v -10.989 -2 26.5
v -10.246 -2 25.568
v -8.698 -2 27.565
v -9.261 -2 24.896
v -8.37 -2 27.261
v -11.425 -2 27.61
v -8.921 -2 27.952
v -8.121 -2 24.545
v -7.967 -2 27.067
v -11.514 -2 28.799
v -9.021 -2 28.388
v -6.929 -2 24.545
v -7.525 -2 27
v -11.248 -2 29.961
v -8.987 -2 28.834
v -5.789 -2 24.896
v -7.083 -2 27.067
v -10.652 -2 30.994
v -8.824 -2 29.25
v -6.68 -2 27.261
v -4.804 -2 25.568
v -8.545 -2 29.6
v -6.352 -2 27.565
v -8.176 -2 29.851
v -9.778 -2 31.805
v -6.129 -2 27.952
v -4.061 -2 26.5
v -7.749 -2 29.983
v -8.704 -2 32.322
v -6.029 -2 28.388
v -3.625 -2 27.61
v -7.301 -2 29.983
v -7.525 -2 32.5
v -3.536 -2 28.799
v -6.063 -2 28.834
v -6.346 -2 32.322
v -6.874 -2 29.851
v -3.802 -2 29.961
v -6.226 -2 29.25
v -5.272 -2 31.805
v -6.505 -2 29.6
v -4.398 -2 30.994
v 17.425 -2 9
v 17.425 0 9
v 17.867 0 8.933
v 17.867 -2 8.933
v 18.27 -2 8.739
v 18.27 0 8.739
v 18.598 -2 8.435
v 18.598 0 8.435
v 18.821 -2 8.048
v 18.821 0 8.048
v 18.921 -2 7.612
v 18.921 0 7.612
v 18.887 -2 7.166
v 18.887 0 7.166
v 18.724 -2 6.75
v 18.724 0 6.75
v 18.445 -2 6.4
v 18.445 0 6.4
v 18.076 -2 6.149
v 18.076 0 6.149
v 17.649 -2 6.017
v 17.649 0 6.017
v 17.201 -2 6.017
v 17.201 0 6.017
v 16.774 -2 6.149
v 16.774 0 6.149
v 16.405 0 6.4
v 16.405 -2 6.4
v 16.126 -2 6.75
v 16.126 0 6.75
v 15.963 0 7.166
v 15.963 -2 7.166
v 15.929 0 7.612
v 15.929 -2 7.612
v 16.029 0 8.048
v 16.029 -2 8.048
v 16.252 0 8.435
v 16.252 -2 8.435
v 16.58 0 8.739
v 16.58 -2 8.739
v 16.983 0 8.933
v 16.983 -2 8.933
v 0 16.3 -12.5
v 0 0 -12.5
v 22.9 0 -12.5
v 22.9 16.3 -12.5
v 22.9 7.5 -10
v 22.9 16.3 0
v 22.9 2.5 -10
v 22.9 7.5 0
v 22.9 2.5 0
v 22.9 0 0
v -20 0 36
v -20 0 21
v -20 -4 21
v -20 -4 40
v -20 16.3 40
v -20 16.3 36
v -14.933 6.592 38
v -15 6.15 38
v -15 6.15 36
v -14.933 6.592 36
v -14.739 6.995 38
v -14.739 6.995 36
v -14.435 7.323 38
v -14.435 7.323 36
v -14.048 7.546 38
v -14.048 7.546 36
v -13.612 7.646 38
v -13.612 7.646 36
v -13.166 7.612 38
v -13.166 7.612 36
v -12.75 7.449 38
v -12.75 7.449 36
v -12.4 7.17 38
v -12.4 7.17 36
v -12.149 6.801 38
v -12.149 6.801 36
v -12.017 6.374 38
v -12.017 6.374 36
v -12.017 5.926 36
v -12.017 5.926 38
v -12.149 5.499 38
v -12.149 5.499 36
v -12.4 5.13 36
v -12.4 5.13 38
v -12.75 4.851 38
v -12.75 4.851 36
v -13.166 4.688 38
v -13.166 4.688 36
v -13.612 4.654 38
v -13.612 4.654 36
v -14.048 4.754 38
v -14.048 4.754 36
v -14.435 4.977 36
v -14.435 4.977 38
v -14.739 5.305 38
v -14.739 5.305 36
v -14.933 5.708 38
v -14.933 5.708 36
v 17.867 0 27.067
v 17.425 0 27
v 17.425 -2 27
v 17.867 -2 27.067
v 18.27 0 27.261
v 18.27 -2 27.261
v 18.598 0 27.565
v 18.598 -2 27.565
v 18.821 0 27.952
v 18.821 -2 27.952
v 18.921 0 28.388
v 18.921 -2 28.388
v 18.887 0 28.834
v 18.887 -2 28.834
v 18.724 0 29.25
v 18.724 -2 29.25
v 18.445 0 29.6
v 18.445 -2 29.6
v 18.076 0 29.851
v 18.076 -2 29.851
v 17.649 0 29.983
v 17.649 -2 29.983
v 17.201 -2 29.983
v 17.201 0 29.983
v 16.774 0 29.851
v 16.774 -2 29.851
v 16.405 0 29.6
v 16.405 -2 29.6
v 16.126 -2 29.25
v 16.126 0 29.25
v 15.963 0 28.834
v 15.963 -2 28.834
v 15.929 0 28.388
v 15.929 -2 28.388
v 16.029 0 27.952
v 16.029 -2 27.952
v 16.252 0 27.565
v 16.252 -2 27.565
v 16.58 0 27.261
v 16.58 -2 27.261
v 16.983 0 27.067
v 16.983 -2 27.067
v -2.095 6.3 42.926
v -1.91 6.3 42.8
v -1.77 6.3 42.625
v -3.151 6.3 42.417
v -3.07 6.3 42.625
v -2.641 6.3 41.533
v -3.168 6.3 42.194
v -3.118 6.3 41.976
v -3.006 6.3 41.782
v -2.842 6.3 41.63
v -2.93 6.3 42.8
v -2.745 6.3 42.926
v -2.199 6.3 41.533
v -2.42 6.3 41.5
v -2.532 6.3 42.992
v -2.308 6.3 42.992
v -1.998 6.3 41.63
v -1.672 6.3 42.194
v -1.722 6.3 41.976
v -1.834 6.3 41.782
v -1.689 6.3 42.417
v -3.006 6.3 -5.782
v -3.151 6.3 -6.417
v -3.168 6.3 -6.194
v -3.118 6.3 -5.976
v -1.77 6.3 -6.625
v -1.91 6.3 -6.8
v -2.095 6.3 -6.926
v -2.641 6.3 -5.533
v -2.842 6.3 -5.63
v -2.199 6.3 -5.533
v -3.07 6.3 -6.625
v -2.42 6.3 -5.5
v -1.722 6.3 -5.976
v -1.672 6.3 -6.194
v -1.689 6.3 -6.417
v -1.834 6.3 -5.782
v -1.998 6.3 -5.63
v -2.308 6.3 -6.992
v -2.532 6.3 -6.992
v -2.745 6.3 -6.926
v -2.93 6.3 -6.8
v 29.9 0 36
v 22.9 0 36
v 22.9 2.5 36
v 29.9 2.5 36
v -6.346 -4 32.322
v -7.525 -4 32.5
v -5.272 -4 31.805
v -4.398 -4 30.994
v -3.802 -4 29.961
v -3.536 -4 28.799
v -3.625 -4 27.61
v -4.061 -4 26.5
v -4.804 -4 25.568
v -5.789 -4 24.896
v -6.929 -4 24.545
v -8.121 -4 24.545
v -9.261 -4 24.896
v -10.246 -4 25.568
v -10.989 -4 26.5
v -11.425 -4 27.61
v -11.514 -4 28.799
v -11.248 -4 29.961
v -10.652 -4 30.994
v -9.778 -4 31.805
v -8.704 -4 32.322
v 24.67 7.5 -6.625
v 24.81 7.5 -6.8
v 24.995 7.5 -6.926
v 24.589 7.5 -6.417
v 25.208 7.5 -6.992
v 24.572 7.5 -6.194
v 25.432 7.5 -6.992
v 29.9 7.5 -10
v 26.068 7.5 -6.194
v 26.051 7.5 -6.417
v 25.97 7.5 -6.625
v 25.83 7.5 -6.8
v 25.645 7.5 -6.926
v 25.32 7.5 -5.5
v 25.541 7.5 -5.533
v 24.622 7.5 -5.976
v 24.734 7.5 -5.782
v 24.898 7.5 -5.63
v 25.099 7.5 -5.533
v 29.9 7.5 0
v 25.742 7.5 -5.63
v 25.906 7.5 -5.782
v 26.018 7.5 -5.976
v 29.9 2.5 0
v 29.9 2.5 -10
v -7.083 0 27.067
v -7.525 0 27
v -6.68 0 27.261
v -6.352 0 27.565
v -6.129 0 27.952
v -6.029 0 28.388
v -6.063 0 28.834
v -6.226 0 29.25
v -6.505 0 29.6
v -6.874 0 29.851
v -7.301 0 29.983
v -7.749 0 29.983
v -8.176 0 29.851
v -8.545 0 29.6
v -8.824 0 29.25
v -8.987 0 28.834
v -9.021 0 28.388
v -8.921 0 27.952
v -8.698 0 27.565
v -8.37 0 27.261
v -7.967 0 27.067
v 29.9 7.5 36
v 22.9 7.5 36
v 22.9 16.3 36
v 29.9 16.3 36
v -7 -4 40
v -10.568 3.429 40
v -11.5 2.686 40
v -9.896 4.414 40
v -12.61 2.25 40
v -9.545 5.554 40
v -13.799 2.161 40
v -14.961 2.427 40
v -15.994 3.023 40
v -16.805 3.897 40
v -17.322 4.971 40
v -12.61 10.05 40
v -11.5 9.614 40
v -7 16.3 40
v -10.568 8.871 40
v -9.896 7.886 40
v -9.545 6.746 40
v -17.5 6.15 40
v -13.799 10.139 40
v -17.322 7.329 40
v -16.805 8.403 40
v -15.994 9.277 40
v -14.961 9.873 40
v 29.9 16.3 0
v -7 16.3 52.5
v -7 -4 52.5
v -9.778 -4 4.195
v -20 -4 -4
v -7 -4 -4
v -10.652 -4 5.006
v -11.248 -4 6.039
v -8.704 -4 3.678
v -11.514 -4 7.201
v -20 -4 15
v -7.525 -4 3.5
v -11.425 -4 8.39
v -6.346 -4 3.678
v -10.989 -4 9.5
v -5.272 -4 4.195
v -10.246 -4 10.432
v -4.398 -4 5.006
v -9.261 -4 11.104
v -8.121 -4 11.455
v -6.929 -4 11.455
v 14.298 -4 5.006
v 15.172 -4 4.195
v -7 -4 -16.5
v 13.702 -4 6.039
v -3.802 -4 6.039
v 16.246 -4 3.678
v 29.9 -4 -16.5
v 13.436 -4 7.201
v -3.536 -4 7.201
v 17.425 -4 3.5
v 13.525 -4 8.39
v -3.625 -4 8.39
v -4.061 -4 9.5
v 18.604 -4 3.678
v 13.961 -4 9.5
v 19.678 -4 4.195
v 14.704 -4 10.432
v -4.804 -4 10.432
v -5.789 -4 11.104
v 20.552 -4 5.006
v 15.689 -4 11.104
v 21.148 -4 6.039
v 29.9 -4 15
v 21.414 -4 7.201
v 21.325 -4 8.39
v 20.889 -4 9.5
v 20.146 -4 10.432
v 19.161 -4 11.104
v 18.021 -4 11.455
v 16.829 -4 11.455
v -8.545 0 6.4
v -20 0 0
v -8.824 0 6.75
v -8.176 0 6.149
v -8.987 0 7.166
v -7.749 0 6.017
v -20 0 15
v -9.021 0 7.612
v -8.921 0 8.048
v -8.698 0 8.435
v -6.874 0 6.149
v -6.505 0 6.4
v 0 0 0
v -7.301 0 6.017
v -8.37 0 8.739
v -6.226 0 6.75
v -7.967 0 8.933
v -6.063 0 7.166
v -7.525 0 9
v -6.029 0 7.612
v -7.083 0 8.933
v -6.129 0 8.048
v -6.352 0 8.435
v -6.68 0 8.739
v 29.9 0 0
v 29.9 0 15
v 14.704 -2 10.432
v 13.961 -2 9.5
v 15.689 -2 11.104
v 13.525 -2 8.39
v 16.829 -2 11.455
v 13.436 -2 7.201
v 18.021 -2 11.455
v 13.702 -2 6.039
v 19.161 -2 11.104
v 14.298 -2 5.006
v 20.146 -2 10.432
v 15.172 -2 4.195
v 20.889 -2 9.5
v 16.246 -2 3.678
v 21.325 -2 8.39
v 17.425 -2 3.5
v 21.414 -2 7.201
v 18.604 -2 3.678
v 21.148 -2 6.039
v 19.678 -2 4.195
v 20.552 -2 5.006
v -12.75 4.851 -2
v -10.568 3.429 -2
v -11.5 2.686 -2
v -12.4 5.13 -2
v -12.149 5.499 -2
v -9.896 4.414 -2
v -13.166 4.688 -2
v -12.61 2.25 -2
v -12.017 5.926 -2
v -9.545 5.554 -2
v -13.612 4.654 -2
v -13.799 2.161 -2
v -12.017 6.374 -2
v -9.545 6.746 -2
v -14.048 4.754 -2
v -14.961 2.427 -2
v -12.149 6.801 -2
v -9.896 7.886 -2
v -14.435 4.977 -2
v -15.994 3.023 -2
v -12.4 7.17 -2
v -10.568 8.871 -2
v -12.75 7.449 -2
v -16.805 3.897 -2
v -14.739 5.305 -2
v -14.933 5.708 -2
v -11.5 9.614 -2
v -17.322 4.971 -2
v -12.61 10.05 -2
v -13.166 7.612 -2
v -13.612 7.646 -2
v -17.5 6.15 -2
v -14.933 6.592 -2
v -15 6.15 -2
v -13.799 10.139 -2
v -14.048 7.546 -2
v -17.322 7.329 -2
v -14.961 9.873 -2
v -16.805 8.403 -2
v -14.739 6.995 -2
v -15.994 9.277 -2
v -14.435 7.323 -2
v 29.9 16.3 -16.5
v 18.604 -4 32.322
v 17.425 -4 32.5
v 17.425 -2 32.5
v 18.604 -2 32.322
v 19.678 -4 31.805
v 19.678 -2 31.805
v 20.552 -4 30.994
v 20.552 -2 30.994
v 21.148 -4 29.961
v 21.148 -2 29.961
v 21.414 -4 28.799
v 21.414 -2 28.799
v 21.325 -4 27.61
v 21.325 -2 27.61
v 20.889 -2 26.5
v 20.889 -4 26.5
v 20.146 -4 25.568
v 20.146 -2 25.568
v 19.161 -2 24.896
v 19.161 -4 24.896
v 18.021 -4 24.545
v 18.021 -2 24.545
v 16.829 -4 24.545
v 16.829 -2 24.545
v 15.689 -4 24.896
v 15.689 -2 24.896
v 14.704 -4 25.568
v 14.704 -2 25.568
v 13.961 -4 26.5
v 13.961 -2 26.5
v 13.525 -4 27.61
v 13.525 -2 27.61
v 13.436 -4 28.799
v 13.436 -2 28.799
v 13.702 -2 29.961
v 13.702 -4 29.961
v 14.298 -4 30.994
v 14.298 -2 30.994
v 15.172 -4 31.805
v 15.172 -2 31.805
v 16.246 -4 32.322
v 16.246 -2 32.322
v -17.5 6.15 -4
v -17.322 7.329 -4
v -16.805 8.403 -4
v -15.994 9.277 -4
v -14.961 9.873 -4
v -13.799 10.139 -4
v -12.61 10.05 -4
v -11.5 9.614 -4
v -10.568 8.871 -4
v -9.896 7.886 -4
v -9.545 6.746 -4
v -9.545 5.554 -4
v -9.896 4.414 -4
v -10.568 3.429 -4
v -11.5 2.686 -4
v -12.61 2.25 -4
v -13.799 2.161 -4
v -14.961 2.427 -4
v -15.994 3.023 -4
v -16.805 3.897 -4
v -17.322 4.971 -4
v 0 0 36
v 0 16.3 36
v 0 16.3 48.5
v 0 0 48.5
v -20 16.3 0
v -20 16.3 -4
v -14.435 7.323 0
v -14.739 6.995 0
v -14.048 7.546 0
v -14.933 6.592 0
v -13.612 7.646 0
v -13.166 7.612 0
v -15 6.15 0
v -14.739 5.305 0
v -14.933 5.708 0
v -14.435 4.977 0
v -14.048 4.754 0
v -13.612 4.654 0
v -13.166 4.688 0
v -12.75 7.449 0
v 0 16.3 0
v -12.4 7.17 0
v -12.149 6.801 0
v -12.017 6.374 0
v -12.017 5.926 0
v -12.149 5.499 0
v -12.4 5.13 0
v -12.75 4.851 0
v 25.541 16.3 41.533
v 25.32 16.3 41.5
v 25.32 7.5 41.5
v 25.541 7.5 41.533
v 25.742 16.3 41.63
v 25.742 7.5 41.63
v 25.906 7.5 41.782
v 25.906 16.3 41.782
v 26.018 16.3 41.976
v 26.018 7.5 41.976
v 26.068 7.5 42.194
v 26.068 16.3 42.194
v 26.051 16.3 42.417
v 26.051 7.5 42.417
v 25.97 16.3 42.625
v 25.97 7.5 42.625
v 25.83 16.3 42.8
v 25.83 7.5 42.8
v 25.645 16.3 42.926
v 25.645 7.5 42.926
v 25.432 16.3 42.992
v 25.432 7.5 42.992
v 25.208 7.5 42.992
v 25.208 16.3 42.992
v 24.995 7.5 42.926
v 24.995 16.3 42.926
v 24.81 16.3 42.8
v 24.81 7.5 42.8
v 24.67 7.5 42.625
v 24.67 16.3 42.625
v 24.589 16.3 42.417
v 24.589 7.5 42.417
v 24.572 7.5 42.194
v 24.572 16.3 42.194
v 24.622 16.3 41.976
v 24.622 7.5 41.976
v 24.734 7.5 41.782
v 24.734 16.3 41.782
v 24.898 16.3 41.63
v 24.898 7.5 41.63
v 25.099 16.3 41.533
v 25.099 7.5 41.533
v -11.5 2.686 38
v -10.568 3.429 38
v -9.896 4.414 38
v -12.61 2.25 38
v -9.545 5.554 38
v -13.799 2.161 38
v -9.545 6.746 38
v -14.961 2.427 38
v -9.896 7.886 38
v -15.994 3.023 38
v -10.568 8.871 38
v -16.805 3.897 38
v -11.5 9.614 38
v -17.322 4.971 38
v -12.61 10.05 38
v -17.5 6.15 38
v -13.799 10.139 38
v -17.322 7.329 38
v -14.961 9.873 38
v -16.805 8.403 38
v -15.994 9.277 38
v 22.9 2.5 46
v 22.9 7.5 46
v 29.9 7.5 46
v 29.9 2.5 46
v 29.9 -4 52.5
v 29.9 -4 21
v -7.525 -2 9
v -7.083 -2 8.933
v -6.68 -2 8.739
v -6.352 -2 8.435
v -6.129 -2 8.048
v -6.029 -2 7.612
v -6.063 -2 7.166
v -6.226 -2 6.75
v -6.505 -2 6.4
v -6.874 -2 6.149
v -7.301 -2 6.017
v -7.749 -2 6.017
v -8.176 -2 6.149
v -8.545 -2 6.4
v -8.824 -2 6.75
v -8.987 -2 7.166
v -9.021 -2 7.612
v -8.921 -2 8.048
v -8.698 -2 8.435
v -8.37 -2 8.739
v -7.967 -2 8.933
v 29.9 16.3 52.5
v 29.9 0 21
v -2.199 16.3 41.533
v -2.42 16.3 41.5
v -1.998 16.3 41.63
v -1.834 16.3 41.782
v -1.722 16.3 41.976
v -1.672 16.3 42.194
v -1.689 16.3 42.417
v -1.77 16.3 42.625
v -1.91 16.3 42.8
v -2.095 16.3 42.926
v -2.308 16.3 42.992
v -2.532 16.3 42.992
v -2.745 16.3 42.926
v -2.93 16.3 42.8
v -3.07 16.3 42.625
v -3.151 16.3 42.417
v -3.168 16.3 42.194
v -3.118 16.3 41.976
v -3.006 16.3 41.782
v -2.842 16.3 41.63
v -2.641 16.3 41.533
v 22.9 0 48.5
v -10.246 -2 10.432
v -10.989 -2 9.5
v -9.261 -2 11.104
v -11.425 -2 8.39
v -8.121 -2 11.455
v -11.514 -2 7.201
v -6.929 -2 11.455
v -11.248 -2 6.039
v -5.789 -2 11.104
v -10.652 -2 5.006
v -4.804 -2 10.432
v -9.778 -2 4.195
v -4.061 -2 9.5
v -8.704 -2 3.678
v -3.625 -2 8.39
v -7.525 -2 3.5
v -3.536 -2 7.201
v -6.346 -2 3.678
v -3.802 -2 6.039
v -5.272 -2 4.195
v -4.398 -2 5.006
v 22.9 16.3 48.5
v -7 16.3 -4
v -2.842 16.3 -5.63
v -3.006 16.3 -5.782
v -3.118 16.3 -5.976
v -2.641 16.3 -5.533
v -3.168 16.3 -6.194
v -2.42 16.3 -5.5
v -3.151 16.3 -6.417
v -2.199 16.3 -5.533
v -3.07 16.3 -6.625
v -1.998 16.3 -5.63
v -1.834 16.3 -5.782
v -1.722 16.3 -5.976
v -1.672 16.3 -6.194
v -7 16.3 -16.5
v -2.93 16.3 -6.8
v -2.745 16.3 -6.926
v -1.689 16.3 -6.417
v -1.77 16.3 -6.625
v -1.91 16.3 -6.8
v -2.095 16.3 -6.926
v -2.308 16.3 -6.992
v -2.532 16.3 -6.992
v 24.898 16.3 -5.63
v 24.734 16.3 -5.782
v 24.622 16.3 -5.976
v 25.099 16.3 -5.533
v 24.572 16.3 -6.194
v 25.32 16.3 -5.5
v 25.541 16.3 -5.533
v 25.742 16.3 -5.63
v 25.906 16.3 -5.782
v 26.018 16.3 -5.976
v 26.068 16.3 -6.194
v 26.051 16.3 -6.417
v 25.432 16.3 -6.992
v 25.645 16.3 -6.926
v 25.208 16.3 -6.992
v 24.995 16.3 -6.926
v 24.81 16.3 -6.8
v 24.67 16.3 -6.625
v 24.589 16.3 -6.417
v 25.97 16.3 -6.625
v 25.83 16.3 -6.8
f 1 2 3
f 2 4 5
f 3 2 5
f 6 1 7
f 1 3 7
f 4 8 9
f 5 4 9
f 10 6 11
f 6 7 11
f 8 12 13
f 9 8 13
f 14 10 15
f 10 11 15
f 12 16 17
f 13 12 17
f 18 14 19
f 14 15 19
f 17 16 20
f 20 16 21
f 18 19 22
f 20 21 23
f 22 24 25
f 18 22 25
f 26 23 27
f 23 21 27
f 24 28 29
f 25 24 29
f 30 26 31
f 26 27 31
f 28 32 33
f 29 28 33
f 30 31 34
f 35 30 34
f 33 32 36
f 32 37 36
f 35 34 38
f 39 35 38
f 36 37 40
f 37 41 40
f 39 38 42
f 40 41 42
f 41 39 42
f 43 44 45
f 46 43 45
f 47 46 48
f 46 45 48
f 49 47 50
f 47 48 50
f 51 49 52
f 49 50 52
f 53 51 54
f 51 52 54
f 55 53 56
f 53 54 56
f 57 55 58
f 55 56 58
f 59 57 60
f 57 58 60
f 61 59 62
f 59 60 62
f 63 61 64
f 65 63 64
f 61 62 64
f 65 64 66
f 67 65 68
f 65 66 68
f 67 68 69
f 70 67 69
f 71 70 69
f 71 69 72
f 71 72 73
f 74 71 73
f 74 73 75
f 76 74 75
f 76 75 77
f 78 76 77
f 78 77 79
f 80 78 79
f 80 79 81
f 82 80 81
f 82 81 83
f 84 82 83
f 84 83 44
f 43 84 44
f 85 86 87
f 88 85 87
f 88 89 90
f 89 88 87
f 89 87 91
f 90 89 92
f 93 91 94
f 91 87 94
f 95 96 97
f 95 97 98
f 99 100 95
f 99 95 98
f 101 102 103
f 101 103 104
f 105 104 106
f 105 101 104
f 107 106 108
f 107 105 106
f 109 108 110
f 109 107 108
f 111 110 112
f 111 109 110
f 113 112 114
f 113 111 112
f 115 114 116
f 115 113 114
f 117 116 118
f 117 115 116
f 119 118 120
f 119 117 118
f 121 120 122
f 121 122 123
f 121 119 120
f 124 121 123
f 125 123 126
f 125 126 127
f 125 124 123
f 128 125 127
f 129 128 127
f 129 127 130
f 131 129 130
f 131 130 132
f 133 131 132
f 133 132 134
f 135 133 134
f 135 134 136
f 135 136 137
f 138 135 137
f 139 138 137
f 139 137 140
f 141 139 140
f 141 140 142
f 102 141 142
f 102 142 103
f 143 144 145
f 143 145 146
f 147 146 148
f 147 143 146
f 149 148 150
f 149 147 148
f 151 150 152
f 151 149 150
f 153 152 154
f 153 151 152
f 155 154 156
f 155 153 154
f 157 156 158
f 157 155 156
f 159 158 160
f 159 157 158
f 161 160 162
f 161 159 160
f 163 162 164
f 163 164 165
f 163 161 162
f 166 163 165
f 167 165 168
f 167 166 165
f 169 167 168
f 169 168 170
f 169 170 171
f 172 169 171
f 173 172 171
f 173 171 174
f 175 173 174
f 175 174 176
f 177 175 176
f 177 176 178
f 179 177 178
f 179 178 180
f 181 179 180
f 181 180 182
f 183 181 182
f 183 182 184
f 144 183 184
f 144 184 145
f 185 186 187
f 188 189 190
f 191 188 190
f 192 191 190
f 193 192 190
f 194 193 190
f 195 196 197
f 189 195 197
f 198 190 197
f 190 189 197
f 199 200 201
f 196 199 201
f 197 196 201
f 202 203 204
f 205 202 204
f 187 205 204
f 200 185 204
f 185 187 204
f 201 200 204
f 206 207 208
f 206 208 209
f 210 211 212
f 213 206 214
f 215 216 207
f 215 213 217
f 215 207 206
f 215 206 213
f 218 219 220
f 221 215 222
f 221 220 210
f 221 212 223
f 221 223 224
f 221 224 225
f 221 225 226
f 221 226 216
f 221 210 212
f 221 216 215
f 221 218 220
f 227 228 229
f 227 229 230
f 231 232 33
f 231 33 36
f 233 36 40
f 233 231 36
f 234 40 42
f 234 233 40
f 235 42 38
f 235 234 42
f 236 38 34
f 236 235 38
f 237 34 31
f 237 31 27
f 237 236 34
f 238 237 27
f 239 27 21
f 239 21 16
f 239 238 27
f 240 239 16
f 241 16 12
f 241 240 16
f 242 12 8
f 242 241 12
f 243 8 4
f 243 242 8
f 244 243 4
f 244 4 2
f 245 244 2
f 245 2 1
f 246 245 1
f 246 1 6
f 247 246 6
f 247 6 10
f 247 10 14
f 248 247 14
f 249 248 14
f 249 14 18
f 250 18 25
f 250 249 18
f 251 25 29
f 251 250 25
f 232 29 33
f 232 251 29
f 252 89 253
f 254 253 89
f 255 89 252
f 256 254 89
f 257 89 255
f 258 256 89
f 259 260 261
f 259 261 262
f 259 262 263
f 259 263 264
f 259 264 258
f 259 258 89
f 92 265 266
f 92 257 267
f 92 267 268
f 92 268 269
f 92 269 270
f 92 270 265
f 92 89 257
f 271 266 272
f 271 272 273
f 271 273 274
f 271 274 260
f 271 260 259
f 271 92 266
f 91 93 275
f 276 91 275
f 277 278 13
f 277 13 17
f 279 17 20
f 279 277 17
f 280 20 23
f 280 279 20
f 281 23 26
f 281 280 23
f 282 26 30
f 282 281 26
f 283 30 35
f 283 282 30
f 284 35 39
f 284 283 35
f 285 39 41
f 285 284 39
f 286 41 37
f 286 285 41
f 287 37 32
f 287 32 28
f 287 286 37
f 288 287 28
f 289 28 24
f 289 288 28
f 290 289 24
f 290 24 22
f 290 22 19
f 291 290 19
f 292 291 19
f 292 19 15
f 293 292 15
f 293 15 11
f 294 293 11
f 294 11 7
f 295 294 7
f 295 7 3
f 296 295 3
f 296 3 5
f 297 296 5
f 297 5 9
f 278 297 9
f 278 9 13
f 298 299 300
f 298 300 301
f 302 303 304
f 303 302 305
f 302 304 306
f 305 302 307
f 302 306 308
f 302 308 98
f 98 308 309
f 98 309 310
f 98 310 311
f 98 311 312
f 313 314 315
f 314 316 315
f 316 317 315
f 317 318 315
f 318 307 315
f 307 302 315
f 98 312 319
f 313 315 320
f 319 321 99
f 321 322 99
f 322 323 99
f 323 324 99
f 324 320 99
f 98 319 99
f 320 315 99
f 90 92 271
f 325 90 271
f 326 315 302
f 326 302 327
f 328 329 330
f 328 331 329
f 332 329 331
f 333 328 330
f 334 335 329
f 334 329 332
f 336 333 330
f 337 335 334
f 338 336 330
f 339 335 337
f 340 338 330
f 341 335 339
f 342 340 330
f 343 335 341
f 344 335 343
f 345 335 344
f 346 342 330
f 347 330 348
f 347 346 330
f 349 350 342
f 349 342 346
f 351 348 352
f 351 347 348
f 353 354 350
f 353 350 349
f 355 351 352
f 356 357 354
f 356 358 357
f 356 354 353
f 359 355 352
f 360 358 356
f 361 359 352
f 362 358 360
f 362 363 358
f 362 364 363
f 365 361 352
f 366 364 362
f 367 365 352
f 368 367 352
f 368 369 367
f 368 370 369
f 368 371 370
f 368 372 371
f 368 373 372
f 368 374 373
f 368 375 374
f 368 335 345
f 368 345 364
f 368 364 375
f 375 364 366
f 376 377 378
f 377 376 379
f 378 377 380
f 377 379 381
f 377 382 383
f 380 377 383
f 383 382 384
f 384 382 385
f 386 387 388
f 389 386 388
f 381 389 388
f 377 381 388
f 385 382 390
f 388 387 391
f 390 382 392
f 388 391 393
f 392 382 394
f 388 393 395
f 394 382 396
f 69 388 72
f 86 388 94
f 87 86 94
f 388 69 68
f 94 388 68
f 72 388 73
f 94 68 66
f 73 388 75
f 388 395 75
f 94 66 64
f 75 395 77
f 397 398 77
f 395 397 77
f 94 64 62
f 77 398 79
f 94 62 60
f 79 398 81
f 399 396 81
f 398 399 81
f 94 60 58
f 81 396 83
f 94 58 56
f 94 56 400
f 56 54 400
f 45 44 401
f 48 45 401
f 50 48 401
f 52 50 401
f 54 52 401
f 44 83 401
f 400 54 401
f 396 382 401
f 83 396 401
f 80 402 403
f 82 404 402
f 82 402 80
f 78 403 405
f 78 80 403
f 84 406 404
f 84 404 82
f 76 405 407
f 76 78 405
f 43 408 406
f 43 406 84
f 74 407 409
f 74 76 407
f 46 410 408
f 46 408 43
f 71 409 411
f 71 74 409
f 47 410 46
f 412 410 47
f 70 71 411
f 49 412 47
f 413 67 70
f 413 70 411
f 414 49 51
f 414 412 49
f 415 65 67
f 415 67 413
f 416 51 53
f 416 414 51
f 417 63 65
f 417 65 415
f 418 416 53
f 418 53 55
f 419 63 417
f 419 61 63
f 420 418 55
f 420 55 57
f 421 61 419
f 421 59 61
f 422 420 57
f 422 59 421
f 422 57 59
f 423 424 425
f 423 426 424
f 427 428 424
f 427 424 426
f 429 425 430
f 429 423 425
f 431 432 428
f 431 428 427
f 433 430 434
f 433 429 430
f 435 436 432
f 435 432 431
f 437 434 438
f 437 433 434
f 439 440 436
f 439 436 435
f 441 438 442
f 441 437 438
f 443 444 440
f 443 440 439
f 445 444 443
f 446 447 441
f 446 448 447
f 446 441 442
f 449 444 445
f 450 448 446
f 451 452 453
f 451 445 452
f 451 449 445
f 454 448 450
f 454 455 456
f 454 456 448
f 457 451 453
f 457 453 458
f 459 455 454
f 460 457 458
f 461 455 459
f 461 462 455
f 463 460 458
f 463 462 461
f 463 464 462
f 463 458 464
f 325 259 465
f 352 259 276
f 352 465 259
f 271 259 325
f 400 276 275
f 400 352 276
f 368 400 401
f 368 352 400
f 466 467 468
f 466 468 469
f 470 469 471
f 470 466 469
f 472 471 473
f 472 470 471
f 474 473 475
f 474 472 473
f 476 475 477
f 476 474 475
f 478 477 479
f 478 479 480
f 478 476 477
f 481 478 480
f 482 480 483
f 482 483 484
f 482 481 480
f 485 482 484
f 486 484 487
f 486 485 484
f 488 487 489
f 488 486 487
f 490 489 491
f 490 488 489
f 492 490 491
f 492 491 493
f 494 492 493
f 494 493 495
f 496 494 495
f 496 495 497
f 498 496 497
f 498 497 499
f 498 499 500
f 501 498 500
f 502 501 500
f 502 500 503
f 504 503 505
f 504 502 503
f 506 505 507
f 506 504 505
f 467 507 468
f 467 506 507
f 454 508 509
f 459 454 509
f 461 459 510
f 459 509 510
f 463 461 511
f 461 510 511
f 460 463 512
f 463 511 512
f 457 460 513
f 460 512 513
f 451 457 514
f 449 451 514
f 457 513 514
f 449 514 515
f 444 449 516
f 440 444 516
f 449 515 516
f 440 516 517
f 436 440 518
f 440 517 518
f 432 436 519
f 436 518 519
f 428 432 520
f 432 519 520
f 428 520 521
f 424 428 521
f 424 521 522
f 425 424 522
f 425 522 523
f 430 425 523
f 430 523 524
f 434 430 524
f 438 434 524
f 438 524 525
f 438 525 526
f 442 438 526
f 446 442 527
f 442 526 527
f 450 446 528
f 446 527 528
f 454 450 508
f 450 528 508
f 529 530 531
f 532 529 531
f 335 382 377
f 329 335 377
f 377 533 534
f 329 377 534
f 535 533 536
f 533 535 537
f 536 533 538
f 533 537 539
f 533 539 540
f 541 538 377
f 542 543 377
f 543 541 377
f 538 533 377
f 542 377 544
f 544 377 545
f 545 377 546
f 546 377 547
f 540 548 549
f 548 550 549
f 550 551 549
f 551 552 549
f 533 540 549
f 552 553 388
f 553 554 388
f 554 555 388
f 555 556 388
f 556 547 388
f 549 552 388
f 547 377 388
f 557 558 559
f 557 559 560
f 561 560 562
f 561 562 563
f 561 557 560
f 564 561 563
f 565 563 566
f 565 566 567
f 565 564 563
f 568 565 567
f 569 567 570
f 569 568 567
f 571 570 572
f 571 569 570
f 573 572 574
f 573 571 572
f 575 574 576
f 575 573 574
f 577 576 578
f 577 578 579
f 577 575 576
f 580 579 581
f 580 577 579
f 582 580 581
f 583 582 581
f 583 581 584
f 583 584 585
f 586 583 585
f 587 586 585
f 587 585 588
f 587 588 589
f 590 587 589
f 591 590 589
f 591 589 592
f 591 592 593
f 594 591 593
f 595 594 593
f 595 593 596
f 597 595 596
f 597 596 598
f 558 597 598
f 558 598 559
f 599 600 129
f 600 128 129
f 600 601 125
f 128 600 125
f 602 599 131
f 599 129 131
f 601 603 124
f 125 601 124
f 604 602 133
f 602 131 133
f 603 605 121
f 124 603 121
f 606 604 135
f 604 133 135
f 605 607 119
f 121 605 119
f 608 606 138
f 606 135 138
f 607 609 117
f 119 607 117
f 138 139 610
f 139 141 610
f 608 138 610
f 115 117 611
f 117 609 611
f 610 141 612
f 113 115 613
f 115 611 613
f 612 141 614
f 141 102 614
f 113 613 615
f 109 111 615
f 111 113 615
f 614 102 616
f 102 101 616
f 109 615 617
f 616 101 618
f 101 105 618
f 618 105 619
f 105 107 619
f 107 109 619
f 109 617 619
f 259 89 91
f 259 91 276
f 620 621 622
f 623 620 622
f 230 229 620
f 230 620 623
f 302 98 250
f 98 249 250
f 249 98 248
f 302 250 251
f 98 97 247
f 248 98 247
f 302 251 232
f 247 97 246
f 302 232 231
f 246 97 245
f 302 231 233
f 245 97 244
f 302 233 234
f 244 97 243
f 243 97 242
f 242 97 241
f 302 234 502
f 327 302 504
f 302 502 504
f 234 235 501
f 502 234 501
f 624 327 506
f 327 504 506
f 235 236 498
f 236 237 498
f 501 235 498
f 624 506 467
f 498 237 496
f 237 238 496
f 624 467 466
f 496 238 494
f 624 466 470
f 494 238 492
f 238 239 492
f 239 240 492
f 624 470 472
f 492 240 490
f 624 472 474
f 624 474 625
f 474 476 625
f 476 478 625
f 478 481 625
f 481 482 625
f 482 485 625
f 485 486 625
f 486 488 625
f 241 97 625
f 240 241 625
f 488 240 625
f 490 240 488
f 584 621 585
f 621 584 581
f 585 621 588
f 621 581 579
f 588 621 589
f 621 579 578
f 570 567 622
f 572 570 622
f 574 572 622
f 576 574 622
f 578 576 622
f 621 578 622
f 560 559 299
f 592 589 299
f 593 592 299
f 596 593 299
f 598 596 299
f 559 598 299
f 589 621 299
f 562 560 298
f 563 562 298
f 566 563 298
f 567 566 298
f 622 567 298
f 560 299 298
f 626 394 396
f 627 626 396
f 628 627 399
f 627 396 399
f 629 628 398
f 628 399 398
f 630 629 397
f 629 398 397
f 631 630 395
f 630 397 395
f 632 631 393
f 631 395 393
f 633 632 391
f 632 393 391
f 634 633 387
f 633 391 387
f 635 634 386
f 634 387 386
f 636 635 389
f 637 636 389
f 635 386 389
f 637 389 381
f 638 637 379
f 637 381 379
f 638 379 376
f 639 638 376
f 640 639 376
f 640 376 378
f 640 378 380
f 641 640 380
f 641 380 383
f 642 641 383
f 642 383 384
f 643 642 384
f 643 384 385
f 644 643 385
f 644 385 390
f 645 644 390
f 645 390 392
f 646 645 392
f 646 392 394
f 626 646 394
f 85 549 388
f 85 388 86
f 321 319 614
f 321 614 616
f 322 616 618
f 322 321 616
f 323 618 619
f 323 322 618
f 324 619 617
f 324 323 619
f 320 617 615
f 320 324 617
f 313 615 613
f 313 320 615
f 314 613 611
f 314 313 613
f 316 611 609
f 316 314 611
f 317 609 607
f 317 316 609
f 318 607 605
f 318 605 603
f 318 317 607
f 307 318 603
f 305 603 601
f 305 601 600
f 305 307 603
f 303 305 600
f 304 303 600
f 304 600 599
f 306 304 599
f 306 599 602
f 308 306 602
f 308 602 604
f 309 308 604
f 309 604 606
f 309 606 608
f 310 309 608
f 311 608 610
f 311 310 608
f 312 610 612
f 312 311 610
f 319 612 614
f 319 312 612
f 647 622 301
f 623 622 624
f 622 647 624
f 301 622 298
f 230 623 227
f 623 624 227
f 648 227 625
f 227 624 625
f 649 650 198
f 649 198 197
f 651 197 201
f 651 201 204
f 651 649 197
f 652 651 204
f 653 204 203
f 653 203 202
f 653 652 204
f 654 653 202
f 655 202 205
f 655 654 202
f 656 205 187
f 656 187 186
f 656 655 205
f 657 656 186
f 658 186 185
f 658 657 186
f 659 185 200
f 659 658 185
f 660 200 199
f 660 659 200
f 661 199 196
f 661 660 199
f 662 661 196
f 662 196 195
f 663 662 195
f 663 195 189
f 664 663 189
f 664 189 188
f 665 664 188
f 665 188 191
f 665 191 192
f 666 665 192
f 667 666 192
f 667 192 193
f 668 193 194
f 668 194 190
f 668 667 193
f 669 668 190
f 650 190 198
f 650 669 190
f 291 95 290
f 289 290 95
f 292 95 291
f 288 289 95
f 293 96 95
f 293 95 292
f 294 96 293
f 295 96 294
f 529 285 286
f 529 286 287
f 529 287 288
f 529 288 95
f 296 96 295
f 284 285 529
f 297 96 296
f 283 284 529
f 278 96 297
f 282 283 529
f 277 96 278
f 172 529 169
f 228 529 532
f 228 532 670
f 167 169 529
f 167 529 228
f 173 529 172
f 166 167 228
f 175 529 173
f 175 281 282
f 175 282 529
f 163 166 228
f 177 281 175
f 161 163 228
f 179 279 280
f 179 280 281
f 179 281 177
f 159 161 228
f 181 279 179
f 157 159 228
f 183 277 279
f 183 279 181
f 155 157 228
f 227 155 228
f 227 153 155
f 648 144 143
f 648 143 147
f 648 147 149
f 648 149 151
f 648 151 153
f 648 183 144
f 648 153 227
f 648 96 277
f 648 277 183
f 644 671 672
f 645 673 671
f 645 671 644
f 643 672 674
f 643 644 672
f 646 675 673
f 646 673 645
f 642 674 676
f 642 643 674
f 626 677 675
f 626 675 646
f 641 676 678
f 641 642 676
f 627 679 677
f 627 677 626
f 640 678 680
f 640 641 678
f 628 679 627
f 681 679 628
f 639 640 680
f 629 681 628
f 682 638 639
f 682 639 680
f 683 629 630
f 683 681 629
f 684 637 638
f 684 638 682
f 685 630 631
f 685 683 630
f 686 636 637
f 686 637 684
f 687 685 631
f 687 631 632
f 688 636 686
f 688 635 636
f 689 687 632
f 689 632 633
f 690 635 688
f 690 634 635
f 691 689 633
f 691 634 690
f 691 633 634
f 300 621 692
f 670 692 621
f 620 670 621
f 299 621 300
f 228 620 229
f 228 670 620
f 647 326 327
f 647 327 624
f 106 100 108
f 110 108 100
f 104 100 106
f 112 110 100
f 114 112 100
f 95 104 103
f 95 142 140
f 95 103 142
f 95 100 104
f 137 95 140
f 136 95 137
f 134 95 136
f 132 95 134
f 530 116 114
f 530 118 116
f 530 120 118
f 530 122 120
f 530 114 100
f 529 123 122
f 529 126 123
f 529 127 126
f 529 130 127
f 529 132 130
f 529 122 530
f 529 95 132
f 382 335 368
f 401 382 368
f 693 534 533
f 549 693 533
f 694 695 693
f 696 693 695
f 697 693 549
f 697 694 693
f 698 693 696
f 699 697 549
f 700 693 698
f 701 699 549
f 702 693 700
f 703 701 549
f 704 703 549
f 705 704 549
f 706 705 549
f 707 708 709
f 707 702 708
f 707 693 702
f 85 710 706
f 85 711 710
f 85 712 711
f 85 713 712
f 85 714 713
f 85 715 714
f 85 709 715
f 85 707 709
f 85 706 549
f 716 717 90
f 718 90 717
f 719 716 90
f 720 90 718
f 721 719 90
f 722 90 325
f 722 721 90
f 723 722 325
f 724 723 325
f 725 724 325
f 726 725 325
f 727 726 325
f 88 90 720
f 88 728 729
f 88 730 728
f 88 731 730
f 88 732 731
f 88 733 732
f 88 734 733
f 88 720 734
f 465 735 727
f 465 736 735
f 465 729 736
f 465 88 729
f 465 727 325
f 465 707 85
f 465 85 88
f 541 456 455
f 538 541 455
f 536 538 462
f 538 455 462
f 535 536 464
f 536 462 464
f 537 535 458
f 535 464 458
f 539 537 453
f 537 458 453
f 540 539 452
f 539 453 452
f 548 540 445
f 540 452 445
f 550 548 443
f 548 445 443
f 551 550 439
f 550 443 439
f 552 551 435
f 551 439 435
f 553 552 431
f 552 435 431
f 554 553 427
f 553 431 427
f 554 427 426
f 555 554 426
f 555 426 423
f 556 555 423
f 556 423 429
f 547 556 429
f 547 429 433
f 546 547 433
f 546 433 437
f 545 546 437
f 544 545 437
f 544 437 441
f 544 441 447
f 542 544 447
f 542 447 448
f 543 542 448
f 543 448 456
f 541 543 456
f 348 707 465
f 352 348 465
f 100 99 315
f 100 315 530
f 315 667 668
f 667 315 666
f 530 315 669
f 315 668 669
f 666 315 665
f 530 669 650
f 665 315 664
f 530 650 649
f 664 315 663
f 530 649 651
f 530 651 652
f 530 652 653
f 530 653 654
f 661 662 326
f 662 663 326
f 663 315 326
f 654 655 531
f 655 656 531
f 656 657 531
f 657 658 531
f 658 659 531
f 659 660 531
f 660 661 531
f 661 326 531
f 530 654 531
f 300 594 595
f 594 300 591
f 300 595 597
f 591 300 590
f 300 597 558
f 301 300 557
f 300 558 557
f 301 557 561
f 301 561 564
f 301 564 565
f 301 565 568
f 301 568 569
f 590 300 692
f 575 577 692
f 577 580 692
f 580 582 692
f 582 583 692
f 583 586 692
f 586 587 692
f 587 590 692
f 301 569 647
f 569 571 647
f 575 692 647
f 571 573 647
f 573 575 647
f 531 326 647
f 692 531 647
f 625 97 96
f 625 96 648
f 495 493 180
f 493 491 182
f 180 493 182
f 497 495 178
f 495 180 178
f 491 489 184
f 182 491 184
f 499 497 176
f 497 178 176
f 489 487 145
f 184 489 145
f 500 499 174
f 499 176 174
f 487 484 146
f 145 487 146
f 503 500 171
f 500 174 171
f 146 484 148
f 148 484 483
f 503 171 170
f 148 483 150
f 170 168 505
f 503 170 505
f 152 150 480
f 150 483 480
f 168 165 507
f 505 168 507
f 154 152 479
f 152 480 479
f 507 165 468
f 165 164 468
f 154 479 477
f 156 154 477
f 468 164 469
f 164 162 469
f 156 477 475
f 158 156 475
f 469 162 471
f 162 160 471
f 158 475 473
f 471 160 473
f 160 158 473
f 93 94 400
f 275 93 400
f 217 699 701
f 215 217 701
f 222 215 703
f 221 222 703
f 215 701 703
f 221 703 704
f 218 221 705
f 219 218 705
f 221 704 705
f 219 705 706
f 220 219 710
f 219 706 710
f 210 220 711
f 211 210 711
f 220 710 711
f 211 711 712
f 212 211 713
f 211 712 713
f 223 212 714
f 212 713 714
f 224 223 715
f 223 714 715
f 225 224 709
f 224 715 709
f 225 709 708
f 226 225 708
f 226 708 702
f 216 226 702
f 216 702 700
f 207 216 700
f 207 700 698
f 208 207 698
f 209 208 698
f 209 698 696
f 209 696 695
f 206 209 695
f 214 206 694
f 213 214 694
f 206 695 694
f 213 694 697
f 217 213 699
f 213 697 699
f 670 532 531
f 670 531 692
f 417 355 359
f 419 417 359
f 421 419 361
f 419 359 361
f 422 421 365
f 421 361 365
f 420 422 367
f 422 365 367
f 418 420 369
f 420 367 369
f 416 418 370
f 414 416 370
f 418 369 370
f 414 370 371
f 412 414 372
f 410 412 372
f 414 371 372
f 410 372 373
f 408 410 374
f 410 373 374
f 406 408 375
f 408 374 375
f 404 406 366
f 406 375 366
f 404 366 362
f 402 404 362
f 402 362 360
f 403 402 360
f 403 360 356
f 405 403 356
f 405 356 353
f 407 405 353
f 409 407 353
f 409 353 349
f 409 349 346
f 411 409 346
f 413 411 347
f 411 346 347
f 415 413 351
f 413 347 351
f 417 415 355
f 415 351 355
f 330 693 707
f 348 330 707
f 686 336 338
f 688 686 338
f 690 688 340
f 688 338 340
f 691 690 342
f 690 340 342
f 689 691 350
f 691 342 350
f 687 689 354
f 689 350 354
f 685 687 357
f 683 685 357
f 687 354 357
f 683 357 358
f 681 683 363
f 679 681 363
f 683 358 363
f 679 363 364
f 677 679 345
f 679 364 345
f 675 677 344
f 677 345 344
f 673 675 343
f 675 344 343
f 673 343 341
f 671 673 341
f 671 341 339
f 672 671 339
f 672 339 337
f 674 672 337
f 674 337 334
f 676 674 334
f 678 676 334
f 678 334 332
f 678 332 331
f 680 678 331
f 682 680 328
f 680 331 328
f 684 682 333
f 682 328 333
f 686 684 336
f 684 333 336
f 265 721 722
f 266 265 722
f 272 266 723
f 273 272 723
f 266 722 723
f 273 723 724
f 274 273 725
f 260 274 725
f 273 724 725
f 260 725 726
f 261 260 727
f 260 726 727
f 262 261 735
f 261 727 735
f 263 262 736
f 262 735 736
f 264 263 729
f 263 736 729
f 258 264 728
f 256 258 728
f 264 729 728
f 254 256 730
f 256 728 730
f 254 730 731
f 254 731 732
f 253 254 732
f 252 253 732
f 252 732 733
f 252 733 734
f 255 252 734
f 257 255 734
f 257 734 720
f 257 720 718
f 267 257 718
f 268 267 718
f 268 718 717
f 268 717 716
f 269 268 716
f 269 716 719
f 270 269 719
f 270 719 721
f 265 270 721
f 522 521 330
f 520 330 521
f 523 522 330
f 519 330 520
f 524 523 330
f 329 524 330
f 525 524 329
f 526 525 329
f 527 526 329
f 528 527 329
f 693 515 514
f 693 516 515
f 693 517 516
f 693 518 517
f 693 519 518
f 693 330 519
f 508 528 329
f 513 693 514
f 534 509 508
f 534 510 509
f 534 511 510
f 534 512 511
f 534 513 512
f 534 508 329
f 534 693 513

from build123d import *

# Parameters (mm, degrees)
EXTRUDE_THIN1_DEPTH = 16.3
BOSS_EXTRUDE1_DEPTH = 4
SKETCH3_W           = 3
SKETCH3_H           = 12.5
SKETCH3_H_2         = 16.5
BOSS_EXTRUDE2_DEPTH = 20.3
SKETCH4_W           = 3
SKETCH4_H           = 15
BOSS_EXTRUDE3_DEPTH = 4
SKETCH6_R           = 1.5
CUT_EXTRUDE1_DEPTH  = 38.841115206
SKETCH7_R           = 4
CUT_EXTRUDE2_DEPTH  = 2
SKETCH8_R           = 1.5
CUT_EXTRUDE3_DEPTH  = 39.996153656
SKETCH9_R           = 4
CUT_EXTRUDE4_DEPTH  = 2
SKETCH10_R          = 0.75
CUT_EXTRUDE5_DEPTH  = 10
SKETCH11_W          = 7
SKETCH11_H          = 5
CUT_EXTRUDE6_DEPTH  = 10


with BuildPart() as part:
    # Sketch1 → Extrude-Thin1 (new body)
    with BuildSketch(Plane(origin=(0, 0, 0), x_dir=(1, 0, 0), z_dir=(0, 1, 0))):
        Polygon((-20, 0), (0, 0), (0, 12.5), (22.9, 12.5), (22.9, 0), (26.9, 0), (26.9, 16.5), (-4, 16.5), (-4, 4), (-20, 4), align=None)
    extrude(amount=EXTRUDE_THIN1_DEPTH)

    # Sketch2 → Boss-Extrude1 (add)
    with BuildSketch(Plane.XZ):
        Polygon((-20, 0), (-20, 15), (26.9, 15), (26.9, 0), (26.9, -16.5), (-4, -16.5), (-4, -4), (-20, -4), align=None)
    extrude(amount=BOSS_EXTRUDE1_DEPTH)

    # Sketch3 → Boss-Extrude2 (add)
    with BuildSketch(Plane(origin=(0, 16.3, 0), x_dir=(1, 0, 0), z_dir=(0, 1, 0))):
        with Locations((-5.5, 10.25)):
            Rectangle(SKETCH3_W, SKETCH3_H)
        with Locations((28.4, 8.25)):
            Rectangle(SKETCH3_W, SKETCH3_H_2)
    extrude(amount=-BOSS_EXTRUDE2_DEPTH)

    # Sketch4 → Boss-Extrude3 (add)
    with BuildSketch(Plane.XZ.offset(4)):
        with Locations((28.4, 7.5)):
            Rectangle(SKETCH4_W, SKETCH4_H)
    extrude(amount=-BOSS_EXTRUDE3_DEPTH)

    # Sketch6 → Cut-Extrude1 (cut, through all)
    with BuildSketch(Plane(origin=(0, 0, 0), x_dir=(1, 0, 0), z_dir=(0, 1, 0))):
        with Locations(Location((-7.525, -7.5, 0), (0, 0, 270))):
            Circle(SKETCH6_R)
        with Locations(Location((17.425, -7.5, 0), (0, 0, 270))):
            Circle(SKETCH6_R)
    extrude(amount=-CUT_EXTRUDE1_DEPTH, mode=Mode.SUBTRACT)

    # Sketch7 → Cut-Extrude2 (cut)
    with BuildSketch(Plane.XZ.offset(4)):
        with Locations(Location((-7.525, 7.5, 0), (0, 0, 270))):
            Circle(SKETCH7_R)
        with Locations(Location((17.425, 7.5, 0), (0, 0, 270))):
            Circle(SKETCH7_R)
    extrude(amount=-CUT_EXTRUDE2_DEPTH, mode=Mode.SUBTRACT)

    # Sketch8 → Cut-Extrude3 (cut, through all)
    with BuildSketch(Plane(origin=(0, 0, -4), x_dir=(-1, 0, 0), z_dir=(0, 0, -1))):
        with Locations((13.5, 6.15)):
            Circle(SKETCH8_R)
    extrude(amount=-CUT_EXTRUDE3_DEPTH, mode=Mode.SUBTRACT)

    # Sketch9 → Cut-Extrude4 (cut)
    with BuildSketch(Plane(origin=(0, 0, -4), x_dir=(-1, 0, 0), z_dir=(0, 0, -1))):
        with Locations((13.5, 6.15)):
            Circle(SKETCH9_R)
    extrude(amount=-CUT_EXTRUDE4_DEPTH, mode=Mode.SUBTRACT)

    # Sketch10 → Cut-Extrude5 (cut)
    with BuildSketch(Plane(origin=(0, 16.3, 0), x_dir=(1, 0, 0), z_dir=(0, 1, 0))):
        with Locations(Location((-2.42, 6.25, 0), (0, 0, 270))):
            Circle(SKETCH10_R)
        with Locations(Location((25.32, 6.25, 0), (0, 0, 270))):
            Circle(SKETCH10_R)
    extrude(amount=-CUT_EXTRUDE5_DEPTH, mode=Mode.SUBTRACT)

    # Sketch11 → Cut-Extrude6 (cut)
    with BuildSketch(Plane.XY):
        with Locations((26.4, 5)):
            Rectangle(SKETCH11_W, SKETCH11_H)
    extrude(amount=-CUT_EXTRUDE6_DEPTH, mode=Mode.SUBTRACT)


with BuildPart() as body_2:
    # Mirror2: mirrored copy
    add(part.part.mirror(Plane.XY.offset(18)))


solid = Compound([part.part, body_2.part])
